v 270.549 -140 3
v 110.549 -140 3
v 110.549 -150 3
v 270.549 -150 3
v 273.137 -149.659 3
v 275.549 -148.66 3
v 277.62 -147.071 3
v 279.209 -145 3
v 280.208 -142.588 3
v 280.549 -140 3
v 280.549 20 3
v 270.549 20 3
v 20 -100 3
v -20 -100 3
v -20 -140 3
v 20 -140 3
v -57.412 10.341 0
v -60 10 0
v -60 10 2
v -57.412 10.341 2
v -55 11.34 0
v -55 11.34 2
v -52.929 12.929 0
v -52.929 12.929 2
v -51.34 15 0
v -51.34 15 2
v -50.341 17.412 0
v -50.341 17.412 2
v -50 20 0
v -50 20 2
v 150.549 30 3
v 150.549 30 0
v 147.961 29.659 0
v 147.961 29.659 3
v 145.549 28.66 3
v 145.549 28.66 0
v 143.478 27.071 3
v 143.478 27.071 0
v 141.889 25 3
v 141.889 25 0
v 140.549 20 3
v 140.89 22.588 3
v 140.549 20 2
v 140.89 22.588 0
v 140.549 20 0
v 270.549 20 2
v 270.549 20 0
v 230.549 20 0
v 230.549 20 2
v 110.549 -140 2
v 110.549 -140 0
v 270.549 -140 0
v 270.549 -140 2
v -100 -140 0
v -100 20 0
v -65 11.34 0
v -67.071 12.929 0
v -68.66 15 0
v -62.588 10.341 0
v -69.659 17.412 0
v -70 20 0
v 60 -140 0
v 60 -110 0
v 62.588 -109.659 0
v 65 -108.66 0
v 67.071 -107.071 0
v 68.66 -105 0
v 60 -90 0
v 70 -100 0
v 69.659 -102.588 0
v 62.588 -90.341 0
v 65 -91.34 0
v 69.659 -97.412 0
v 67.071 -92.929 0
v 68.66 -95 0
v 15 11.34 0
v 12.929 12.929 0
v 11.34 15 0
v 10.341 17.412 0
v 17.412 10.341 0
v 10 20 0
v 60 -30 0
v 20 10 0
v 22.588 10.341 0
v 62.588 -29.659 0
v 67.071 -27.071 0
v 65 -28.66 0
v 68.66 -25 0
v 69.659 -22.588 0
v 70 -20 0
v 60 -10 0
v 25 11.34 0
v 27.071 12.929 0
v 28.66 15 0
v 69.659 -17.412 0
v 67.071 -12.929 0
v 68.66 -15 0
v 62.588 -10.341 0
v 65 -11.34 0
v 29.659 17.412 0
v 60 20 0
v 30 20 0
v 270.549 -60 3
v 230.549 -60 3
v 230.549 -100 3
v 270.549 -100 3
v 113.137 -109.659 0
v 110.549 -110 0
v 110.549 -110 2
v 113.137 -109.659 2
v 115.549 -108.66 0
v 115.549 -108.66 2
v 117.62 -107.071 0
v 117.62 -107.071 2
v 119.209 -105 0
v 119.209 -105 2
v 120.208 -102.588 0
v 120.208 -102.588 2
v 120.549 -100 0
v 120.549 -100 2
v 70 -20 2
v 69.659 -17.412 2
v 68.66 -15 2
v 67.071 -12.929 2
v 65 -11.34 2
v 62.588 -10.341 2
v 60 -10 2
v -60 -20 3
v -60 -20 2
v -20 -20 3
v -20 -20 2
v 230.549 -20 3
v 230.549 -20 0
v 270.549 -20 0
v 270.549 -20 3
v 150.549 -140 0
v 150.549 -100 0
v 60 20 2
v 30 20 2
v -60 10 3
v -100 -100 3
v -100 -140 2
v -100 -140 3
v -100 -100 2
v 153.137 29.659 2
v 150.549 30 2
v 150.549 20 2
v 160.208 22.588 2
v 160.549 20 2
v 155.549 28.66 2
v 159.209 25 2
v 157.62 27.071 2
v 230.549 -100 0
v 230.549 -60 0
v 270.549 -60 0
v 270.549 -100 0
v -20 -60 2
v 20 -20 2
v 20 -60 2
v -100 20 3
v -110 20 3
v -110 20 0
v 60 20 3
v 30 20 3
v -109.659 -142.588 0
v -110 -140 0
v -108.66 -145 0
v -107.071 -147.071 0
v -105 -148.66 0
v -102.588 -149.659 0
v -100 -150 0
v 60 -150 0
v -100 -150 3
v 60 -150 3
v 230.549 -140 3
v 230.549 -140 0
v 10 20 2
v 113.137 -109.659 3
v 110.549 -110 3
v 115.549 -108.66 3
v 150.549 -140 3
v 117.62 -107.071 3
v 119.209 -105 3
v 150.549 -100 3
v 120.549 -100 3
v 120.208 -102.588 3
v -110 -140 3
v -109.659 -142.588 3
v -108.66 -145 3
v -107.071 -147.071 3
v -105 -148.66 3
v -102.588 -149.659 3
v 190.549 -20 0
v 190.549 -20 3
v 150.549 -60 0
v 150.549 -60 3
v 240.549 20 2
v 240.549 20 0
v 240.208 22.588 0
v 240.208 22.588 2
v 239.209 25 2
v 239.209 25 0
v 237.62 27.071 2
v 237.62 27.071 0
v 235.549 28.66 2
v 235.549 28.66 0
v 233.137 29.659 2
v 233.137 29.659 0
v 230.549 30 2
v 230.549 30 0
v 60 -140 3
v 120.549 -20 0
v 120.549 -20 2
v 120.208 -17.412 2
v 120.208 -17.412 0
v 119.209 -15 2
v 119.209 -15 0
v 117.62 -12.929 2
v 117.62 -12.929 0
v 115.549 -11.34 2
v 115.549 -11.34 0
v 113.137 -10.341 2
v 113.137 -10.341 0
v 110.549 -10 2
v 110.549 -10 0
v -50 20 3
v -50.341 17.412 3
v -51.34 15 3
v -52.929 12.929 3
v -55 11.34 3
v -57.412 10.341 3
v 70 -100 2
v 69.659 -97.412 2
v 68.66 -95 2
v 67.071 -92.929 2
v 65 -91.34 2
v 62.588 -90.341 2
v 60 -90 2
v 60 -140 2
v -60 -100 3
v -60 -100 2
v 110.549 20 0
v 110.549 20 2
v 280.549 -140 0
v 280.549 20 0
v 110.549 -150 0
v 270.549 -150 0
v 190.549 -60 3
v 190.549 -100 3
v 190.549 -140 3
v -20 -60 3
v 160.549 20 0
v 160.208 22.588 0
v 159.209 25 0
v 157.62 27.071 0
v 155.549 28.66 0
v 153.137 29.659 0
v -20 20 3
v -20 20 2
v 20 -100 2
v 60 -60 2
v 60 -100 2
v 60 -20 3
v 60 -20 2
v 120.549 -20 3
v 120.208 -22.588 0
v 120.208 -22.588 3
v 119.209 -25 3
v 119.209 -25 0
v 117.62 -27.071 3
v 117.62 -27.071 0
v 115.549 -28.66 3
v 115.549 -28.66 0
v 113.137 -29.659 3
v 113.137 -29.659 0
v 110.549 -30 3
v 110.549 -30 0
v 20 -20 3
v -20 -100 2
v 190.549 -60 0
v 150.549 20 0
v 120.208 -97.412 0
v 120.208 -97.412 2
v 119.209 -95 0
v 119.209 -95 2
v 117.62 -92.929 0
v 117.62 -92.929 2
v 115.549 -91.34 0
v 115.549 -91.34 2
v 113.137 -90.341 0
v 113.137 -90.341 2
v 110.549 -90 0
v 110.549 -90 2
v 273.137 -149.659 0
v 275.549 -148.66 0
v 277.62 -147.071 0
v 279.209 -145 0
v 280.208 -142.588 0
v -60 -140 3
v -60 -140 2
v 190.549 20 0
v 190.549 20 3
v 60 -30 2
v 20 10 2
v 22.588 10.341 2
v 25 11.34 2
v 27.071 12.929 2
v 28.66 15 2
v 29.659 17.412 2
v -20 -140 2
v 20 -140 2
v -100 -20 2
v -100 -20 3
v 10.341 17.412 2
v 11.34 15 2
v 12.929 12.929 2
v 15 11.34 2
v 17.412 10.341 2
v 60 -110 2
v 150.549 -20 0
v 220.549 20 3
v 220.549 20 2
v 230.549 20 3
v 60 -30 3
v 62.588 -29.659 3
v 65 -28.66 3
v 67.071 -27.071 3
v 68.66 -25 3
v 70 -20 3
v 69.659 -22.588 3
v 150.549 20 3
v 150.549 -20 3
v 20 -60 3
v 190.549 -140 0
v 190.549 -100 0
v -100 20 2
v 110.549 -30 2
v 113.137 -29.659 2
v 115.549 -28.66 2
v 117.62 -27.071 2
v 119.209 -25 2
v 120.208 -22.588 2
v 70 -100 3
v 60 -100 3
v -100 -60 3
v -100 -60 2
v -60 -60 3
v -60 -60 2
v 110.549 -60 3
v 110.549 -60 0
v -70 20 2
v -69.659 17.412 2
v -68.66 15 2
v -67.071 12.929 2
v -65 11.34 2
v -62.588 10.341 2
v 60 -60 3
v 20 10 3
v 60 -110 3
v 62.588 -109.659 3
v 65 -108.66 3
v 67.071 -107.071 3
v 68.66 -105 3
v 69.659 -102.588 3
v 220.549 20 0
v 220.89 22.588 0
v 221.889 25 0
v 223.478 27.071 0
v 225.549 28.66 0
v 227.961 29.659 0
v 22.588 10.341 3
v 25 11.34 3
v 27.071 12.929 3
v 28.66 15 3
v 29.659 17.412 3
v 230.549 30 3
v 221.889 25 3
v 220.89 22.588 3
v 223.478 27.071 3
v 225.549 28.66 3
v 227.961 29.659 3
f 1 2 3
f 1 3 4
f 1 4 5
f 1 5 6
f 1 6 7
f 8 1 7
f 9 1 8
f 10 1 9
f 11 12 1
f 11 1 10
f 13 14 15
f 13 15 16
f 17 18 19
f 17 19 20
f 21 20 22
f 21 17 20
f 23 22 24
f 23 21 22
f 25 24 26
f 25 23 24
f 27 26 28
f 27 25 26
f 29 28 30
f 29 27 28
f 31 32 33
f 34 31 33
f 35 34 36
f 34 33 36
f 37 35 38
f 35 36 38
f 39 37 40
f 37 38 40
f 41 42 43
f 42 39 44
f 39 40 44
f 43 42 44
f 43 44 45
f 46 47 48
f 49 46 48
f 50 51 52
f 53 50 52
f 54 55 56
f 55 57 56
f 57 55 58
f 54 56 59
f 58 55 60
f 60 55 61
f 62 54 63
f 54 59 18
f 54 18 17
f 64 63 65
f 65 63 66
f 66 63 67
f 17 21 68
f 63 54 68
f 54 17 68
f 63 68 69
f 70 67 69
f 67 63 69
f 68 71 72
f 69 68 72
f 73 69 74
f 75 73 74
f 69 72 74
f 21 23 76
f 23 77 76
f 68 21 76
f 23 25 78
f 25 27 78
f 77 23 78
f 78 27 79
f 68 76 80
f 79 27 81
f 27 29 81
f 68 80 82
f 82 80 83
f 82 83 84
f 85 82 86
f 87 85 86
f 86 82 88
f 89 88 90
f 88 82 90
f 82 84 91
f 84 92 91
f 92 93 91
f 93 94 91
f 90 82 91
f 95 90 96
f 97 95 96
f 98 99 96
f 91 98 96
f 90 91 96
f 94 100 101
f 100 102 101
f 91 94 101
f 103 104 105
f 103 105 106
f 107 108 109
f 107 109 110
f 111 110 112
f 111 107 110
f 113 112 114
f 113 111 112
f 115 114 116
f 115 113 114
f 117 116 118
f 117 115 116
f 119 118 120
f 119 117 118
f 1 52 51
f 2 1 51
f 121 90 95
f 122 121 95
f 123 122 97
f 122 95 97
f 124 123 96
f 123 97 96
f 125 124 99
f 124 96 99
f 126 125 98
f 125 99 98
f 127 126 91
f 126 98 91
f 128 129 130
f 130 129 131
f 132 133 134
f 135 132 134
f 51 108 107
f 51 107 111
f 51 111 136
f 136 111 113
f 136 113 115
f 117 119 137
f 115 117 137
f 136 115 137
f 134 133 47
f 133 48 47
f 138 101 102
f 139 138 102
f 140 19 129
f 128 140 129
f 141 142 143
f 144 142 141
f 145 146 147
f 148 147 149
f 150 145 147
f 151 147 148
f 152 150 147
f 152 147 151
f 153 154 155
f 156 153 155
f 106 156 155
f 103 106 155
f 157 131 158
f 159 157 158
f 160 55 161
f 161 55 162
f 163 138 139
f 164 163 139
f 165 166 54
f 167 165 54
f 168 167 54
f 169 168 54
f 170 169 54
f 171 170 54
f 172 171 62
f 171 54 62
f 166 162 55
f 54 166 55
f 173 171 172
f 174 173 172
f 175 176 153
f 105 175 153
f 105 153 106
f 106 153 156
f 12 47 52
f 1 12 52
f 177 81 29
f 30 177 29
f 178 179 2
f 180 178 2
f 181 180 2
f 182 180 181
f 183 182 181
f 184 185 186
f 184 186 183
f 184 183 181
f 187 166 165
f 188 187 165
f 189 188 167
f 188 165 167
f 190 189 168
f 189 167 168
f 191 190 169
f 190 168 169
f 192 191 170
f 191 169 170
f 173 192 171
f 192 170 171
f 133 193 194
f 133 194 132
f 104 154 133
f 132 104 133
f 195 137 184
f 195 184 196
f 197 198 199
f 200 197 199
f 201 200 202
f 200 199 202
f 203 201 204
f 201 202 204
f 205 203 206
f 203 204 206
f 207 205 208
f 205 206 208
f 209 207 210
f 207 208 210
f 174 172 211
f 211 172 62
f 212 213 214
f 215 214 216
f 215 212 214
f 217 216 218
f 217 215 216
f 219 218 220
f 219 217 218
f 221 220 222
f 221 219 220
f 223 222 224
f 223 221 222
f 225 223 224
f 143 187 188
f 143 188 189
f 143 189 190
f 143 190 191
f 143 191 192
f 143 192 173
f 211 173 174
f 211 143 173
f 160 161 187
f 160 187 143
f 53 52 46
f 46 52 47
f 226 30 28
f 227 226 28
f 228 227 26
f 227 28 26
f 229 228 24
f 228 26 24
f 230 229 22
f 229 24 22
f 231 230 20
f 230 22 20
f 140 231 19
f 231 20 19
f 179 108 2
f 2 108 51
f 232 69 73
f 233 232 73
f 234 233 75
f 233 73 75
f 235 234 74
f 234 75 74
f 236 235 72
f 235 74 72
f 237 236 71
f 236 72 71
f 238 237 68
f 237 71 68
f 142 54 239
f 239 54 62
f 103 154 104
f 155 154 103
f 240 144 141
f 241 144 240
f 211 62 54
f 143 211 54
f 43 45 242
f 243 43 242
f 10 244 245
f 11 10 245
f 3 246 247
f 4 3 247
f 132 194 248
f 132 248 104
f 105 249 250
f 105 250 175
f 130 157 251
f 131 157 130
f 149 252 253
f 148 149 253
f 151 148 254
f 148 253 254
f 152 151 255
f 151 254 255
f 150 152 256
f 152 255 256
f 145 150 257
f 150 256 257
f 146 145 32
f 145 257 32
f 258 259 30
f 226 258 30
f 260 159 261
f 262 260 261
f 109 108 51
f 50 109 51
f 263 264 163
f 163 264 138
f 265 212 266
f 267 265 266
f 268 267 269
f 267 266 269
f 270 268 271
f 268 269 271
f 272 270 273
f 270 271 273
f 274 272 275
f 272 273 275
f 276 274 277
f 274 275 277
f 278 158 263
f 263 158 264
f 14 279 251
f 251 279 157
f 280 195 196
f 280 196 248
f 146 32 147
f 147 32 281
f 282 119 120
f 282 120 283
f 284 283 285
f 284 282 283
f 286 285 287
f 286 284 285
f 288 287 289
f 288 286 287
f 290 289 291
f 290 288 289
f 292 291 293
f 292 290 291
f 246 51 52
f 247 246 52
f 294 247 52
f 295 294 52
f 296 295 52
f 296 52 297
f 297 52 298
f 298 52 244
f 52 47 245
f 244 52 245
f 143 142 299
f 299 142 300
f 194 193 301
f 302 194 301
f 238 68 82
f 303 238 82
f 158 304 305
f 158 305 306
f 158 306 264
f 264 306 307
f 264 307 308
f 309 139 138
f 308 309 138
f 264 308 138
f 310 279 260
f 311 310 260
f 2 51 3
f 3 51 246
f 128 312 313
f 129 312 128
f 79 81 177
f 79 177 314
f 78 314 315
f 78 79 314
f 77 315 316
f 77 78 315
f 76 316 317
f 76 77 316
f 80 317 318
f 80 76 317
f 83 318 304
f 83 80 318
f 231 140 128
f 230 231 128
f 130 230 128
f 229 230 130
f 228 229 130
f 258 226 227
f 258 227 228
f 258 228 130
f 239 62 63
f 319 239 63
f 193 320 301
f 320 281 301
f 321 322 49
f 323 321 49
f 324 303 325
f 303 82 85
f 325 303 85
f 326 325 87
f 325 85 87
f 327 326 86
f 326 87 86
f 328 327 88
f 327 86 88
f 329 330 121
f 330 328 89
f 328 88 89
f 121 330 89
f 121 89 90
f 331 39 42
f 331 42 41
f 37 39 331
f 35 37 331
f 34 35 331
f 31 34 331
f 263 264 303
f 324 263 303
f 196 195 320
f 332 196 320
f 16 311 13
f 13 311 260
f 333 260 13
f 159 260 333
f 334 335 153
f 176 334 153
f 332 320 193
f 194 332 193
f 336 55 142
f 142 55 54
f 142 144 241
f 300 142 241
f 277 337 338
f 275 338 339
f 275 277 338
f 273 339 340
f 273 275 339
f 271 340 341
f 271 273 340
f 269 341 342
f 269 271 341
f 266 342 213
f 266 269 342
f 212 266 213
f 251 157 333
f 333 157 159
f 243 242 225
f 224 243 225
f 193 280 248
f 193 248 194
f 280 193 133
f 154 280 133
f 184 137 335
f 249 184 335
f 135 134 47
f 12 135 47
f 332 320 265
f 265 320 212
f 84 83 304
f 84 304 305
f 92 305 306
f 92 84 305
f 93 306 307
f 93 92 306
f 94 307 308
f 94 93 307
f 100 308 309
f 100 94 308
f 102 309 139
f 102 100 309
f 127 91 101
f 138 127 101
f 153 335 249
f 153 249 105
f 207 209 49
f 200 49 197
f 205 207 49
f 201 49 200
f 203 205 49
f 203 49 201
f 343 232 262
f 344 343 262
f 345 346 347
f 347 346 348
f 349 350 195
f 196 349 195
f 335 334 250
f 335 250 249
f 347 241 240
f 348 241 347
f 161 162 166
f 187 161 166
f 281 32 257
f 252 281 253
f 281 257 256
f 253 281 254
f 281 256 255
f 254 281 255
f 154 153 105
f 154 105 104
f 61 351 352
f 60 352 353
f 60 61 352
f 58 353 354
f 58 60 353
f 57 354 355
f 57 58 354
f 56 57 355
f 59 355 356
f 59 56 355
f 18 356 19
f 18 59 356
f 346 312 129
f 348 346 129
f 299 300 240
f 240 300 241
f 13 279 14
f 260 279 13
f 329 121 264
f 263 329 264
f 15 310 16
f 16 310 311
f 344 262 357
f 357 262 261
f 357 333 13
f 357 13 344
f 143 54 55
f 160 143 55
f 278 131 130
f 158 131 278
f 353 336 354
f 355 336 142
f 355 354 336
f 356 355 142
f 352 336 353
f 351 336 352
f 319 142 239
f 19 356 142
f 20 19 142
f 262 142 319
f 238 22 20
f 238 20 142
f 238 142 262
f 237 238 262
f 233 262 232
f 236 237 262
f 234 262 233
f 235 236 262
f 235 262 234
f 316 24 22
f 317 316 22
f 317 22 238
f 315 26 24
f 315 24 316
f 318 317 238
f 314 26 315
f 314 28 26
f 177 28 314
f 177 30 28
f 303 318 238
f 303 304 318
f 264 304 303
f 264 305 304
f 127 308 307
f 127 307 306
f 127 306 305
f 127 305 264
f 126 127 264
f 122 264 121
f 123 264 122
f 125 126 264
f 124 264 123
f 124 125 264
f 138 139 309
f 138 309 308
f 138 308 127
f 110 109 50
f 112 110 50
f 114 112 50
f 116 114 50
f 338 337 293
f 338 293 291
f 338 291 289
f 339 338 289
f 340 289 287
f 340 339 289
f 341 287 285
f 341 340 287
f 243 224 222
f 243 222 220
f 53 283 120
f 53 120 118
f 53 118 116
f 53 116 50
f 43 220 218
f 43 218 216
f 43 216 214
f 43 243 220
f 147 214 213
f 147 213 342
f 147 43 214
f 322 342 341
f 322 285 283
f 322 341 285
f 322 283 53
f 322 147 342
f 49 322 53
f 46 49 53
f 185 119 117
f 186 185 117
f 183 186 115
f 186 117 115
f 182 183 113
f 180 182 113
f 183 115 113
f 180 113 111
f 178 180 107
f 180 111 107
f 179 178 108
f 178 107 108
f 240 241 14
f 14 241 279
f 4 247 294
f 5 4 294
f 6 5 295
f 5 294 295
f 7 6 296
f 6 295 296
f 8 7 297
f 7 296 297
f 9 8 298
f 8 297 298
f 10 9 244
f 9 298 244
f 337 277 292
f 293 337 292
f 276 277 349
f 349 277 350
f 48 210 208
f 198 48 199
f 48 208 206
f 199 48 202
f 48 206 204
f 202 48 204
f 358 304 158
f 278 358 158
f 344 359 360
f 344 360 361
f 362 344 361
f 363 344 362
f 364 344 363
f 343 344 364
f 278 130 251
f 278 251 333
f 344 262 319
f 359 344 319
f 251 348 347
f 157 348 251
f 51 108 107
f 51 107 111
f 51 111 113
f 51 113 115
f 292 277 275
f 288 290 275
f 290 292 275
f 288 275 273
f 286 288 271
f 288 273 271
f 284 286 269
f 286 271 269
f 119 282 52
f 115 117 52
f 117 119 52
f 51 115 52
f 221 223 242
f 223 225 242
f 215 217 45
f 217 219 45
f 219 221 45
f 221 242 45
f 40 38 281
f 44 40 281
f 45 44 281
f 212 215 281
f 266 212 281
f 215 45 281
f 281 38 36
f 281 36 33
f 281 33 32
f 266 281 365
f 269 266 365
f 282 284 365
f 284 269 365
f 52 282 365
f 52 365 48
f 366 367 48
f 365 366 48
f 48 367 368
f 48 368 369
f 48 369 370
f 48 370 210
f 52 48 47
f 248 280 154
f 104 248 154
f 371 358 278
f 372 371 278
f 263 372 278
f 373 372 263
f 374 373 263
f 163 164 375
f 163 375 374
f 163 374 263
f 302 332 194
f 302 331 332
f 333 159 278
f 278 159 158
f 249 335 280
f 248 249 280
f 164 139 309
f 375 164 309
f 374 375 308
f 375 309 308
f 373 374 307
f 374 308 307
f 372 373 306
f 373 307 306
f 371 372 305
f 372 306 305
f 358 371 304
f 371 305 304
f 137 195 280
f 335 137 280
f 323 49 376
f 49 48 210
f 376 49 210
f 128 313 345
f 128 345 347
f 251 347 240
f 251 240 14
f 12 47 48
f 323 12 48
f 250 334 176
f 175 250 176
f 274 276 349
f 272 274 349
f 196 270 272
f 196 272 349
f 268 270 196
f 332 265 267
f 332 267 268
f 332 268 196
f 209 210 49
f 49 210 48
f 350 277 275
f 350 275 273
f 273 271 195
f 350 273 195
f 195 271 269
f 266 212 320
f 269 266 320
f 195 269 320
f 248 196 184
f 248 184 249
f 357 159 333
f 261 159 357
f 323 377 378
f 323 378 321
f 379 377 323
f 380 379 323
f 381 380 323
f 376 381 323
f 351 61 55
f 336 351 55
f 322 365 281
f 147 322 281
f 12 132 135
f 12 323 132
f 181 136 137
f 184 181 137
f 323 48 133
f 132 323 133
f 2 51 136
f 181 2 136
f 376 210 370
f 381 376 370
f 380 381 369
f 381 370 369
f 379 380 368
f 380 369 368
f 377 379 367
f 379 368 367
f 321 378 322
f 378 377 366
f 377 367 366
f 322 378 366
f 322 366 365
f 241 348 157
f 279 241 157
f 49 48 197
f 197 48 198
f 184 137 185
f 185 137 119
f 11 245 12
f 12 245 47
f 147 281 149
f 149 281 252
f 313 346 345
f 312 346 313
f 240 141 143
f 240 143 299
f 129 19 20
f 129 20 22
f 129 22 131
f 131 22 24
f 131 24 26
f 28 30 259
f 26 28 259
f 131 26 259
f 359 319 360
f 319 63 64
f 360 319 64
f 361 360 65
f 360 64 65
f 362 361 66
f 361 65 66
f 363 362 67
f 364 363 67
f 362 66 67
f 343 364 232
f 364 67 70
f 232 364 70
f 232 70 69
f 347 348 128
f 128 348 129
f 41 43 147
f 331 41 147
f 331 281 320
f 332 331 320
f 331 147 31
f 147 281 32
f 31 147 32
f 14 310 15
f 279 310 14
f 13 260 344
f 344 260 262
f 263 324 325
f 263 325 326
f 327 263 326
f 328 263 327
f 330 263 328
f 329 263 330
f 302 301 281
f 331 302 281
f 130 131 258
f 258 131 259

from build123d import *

# Parameters (mm, degrees)
F0_W      = 40
F0_H      = 40
F1_DEPTH  = 2
F3_DEPTH  = 2
F4_DEPTH  = 5
F2_W      = 40
F2_H      = 40
F5_DEPTH  = 1
F6_DEPTH  = 2
F7_DEPTH  = 3
F8_DEPTH  = 4
F9_DEPTH  = 3
F10_DEPTH = 3
F11_DEPTH = 3
F12_DEPTH = 2


with BuildPart() as f1:
    # F0 (on Top) → F1 (new body)
    with BuildSketch(Plane.XY):
        with BuildLine():
            Line((-100, -20), (-60, -20))
            Line((-60, -20), (-60, 10))
            ThreePointArc((-60, 10), (-67.0710678119, 12.9289321881), (-70, 20))
            Line((-70, 20), (-100, 20))
            Line((-100, 20), (-100, -20))
        make_face()
        with BuildLine():
            ThreePointArc((-70, 20), (-67.0710678119, 12.9289321881), (-60, 10))
            Line((-60, 10), (-60, 20))
            Line((-60, 20), (-70, 20))
        make_face()
        with BuildLine():
            ThreePointArc((-60, 10), (-52.9289321881, 12.9289321881), (-50, 20))
            Line((-50, 20), (-60, 20))
            Line((-60, 20), (-60, 10))
        make_face()
        with BuildLine():
            Line((-60, -20), (-20, -20))
            Line((-20, -20), (-20, 20))
            Line((-20, 20), (-50, 20))
            ThreePointArc((-50, 20), (-52.9289321881, 12.9289321881), (-60, 10))
            Line((-60, 10), (-60, -20))
        make_face()
        with BuildLine():
            Line((-20, -20), (20, -20))
            Line((20, -20), (20, 10))
            ThreePointArc((20, 10), (12.9289321881, 12.9289321881), (10, 20))
            Line((10, 20), (-20, 20))
            Line((-20, 20), (-20, -20))
        make_face()
        with BuildLine():
            ThreePointArc((10, 20), (12.9289321881, 12.9289321881), (20, 10))
            Line((20, 10), (20, 20))
            Line((20, 20), (10, 20))
        make_face()
        with BuildLine():
            Line((20, 20), (20, 10))
            ThreePointArc((20, 10), (27.0710678119, 12.9289321881), (30, 20))
            Line((30, 20), (20, 20))
        make_face()
        with BuildLine():
            Line((20, 10), (20, -20))
            Line((20, -20), (50, -20))
            ThreePointArc((50, -20), (52.9289321881, -12.9289321881), (60, -10))
            Line((60, -10), (60, 20))
            Line((60, 20), (30, 20))
            ThreePointArc((30, 20), (27.0710678119, 12.9289321881), (20, 10))
        make_face()
        with BuildLine():
            ThreePointArc((60, -10), (52.9289321881, -12.9289321881), (50, -20))
            Line((50, -20), (60, -20))
            Line((60, -20), (60, -10))
        make_face()
        with BuildLine():
            Line((60, -20), (50, -20))
            ThreePointArc((50, -20), (52.9289321881, -27.0710678119), (60, -30))
            Line((60, -30), (60, -20))
        make_face()
        with BuildLine():
            Line((50, -20), (20, -20))
            Line((20, -20), (20, -60))
            Line((20, -60), (60, -60))
            Line((60, -60), (60, -30))
            ThreePointArc((60, -30), (52.9289321881, -27.0710678119), (50, -20))
        make_face()
        with Locations((0, -40)):
            Rectangle(F0_W, F0_H)
        with Locations((-40, -40)):
            Rectangle(F0_W, F0_H)
        with Locations((-80, -40)):
            Rectangle(F0_W, F0_H)
        with Locations((-80, -80)):
            Rectangle(F0_W, F0_H)
        with BuildLine():
            Line((-60, -140), (-60, -100))
            Line((-60, -100), (-100, -100))
            Line((-100, -100), (-100, -130))
            ThreePointArc((-100, -130), (-92.9289321881, -132.9289321881), (-90, -140))
            Line((-90, -140), (-60, -140))
        make_face()
        with Locations((-40, -120)):
            Rectangle(F0_W, F0_H)
        with Locations((-40, -80)):
            Rectangle(F0_W, F0_H)
        with Locations((0, -80)):
            Rectangle(F0_W, F0_H)
        with Locations((0, -120)):
            Rectangle(F0_W, F0_H)
        with BuildLine():
            Line((50, -100), (20, -100))
            Line((20, -100), (20, -140))
            Line((20, -140), (60, -140))
            Line((60, -140), (60, -110))
            ThreePointArc((60, -110), (52.9289321881, -107.0710678119), (50, -100))
        make_face()
        with BuildLine():
            Line((60, -60), (20, -60))
            Line((20, -60), (20, -100))
            Line((20, -100), (50, -100))
            ThreePointArc((50, -100), (52.9289321881, -92.9289321881), (60, -90))
            Line((60, -90), (60, -60))
        make_face()
        with BuildLine():
            Line((60, -100), (60, -90))
            ThreePointArc((60, -90), (52.9289321881, -92.9289321881), (50, -100))
            Line((50, -100), (60, -100))
        make_face()
        with BuildLine():
            Line((60, -100), (50, -100))
            ThreePointArc((50, -100), (52.9289321881, -107.0710678119), (60, -110))
            Line((60, -110), (60, -100))
        make_face()
        with BuildLine():
            ThreePointArc((-90, -140), (-92.9289321881, -132.9289321881), (-100, -130))
            Line((-100, -130), (-100, -140))
            Line((-100, -140), (-90, -140))
        make_face()
    extrude(amount=F1_DEPTH)

    # F0 (on Top) → F3 (join)
    with BuildSketch(Plane.XY):
        with BuildLine():
            ThreePointArc((70, -100), (67.0710678119, -92.9289321881), (60, -90))
            Line((60, -90), (60, -100))
            Line((60, -100), (70, -100))
        make_face()
        with BuildLine():
            Line((60, -10), (60, -20))
            Line((60, -20), (70, -20))
            ThreePointArc((70, -20), (67.0710678119, -12.9289321881), (60, -10))
        make_face()
    extrude(amount=F3_DEPTH)

    # F0 (on Top) → F4 (cut)
    with BuildSketch(Plane.XY):
        with BuildLine():
            ThreePointArc((-70, 20), (-67.0710678119, 12.9289321881), (-60, 10))
            Line((-60, 10), (-60, 20))
            Line((-60, 20), (-70, 20))
        make_face()
        with BuildLine():
            ThreePointArc((-60, 10), (-52.9289321881, 12.9289321881), (-50, 20))
            Line((-50, 20), (-60, 20))
            Line((-60, 20), (-60, 10))
        make_face()
        with BuildLine():
            ThreePointArc((10, 20), (12.9289321881, 12.9289321881), (20, 10))
            Line((20, 10), (20, 20))
            Line((20, 20), (10, 20))
        make_face()
        with BuildLine():
            Line((20, 20), (20, 10))
            ThreePointArc((20, 10), (27.0710678119, 12.9289321881), (30, 20))
            Line((30, 20), (20, 20))
        make_face()
    extrude(amount=F4_DEPTH, mode=Mode.SUBTRACT)

    # F0 (on Top) → F10 (join)
    with BuildSketch(Plane.XY):
        with BuildLine():
            Line((70, -100), (60, -100))
            Line((60, -100), (60, -110))
            ThreePointArc((60, -110), (67.0710678119, -107.0710678119), (70, -100))
        make_face()
        with BuildLine():
            Line((70, -20), (60, -20))
            Line((60, -20), (60, -30))
            ThreePointArc((60, -30), (67.0710678119, -27.0710678119), (70, -20))
        make_face()
    extrude(amount=F10_DEPTH)


with BuildPart() as f5:
    # F2 (on face) → F5 (new body)
    with BuildSketch(Plane.XY.offset(2)):
        with Locations((-80, -120)):
            Rectangle(F2_W, F2_H)
    extrude(amount=F5_DEPTH)


with BuildPart() as f5b:
    # F2 (on face) → F5, piece 2 (new body)
    with BuildSketch(Plane.XY.offset(2)):
        with Locations((0, -120)):
            Rectangle(F2_W, F2_H)
    extrude(amount=F5_DEPTH)


with BuildPart() as f5c:
    # F2 (on face) → F5, piece 3 (new body)
    with BuildSketch(Plane.XY.offset(2)):
        with Locations((-40, -80)):
            Rectangle(F2_W, F2_H)
    extrude(amount=F5_DEPTH)


with BuildPart() as f5d:
    # F2 (on face) → F5, piece 4 (new body)
    with BuildSketch(Plane.XY.offset(2)):
        with Locations((40, -80)):
            Rectangle(F2_W, F2_H)
    extrude(amount=F5_DEPTH)


with BuildPart() as f5e:
    # F2 (on face) → F5, piece 5 (new body)
    with BuildSketch(Plane.XY.offset(2)):
        with Locations((-80, -40)):
            Rectangle(F2_W, F2_H)
    extrude(amount=F5_DEPTH)


with BuildPart() as f5f:
    # F2 (on face) → F5, piece 6 (new body)
    with BuildSketch(Plane.XY.offset(2)):
        with Locations((0, -40)):
            Rectangle(F2_W, F2_H)
    extrude(amount=F5_DEPTH)


with BuildPart() as f5g:
    # F2 (on face) → F5, piece 7 (new body)
    with BuildSketch(Plane.XY.offset(2)):
        with BuildLine():
            Line((60, -20), (60, 20))
            Line((60, 20), (30, 20))
            ThreePointArc((30, 20), (27.0710678119, 12.9289321881), (20, 10))
            Line((20, 10), (20, -20))
            Line((20, -20), (60, -20))
        make_face()
    extrude(amount=F5_DEPTH)


with BuildPart() as f5h:
    # F2 (on face) → F5, piece 8 (new body)
    with BuildSketch(Plane.XY.offset(2)):
        with BuildLine():
            Line((-60, -20), (-20, -20))
            Line((-20, -20), (-20, 20))
            Line((-20, 20), (-50, 20))
            ThreePointArc((-50, 20), (-52.9289321881, 12.9289321881), (-60, 10))
            Line((-60, 10), (-60, -20))
        make_face()
    extrude(amount=F5_DEPTH)


with BuildPart() as f6:
    # F0 (on Top) → F6 (new body)
    with BuildSketch(Plane.XY):
        with BuildLine():
            Line((150.5487942696, -140), (150.5487942696, -100))
            Line((150.5487942696, -100), (120.5487942696, -100))
            ThreePointArc((120.5487942696, -100), (117.6198620814, -107.0710678119), (110.5487942696, -110))
            Line((110.5487942696, -110), (110.5487942696, -140))
            Line((110.5487942696, -140), (150.5487942696, -140))
        make_face()
        with BuildLine():
            ThreePointArc((110.5487942696, -110), (117.6198620814, -107.0710678119), (120.5487942696, -100))
            Line((120.5487942696, -100), (110.5487942696, -100))
            Line((110.5487942696, -100), (110.5487942696, -110))
        make_face()
        with BuildLine():
            ThreePointArc((120.5487942696, -100), (117.6198620814, -92.9289321881), (110.5487942696, -90))
            Line((110.5487942696, -90), (110.5487942696, -100))
            Line((110.5487942696, -100), (120.5487942696, -100))
        make_face()
        with BuildLine():
            Line((150.5487942696, -100), (150.5487942696, -60))
            Line((150.5487942696, -60), (110.5487942696, -60))
            Line((110.5487942696, -60), (110.5487942696, -90))
            ThreePointArc((110.5487942696, -90), (117.6198620814, -92.9289321881), (120.5487942696, -100))
            Line((120.5487942696, -100), (150.5487942696, -100))
        make_face()
        with BuildLine():
            Line((150.5487942696, -20), (120.5487942696, -20))
            ThreePointArc((120.5487942696, -20), (117.6198620814, -27.0710678119), (110.5487942696, -30))
            Line((110.5487942696, -30), (110.5487942696, -60))
            Line((110.5487942696, -60), (150.5487942696, -60))
            Line((150.5487942696, -60), (150.5487942696, -20))
        make_face()
        with BuildLine():
            Line((120.5487942696, -20), (110.5487942696, -20))
            Line((110.5487942696, -20), (110.5487942696, -30))
            ThreePointArc((110.5487942696, -30), (117.6198620814, -27.0710678119), (120.5487942696, -20))
        make_face()
        with BuildLine():
            ThreePointArc((120.5487942696, -20), (117.6198620814, -12.9289321881), (110.5487942696, -10))
            Line((110.5487942696, -10), (110.5487942696, -20))
            Line((110.5487942696, -20), (120.5487942696, -20))
        make_face()
        with BuildLine():
            Line((140.5487942696, 20), (110.5487942696, 20))
            Line((110.5487942696, 20), (110.5487942696, -10))
            ThreePointArc((110.5487942696, -10), (117.6198620814, -12.9289321881), (120.5487942696, -20))
            Line((120.5487942696, -20), (150.5487942696, -20))
            Line((150.5487942696, -20), (150.5487942696, 10))
            ThreePointArc((150.5487942696, 10), (143.4777264577, 12.9289321881), (140.5487942696, 20))
        make_face()
        with BuildLine():
            Line((150.5487942696, 20), (140.5487942696, 20))
            ThreePointArc((140.5487942696, 20), (143.4777264577, 12.9289321881), (150.5487942696, 10))
            Line((150.5487942696, 10), (150.5487942696, 20))
        make_face()
        with BuildLine():
            Line((160.5487942696, 20), (150.5487942696, 20))
            Line((150.5487942696, 20), (150.5487942696, 10))
            ThreePointArc((150.5487942696, 10), (157.6198620814, 12.9289321881), (160.5487942696, 20))
        make_face()
        with BuildLine():
            ThreePointArc((160.5487942696, 20), (157.6198620814, 12.9289321881), (150.5487942696, 10))
            Line((150.5487942696, 10), (150.5487942696, -20))
            Line((150.5487942696, -20), (190.5487942696, -20))
            Line((190.5487942696, -20), (190.5487942696, 20))
            Line((190.5487942696, 20), (160.5487942696, 20))
        make_face()
        with BuildLine():
            Line((220.5487942696, 20), (190.5487942696, 20))
            Line((190.5487942696, 20), (190.5487942696, -20))
            Line((190.5487942696, -20), (230.5487942696, -20))
            Line((230.5487942696, -20), (230.5487942696, 10))
            ThreePointArc((230.5487942696, 10), (223.4777264577, 12.9289321881), (220.5487942696, 20))
        make_face()
        with BuildLine():
            Line((230.5487942696, 20), (220.5487942696, 20))
            ThreePointArc((220.5487942696, 20), (223.4777264577, 12.9289321881), (230.5487942696, 10))
            Line((230.5487942696, 10), (230.5487942696, 20))
        make_face()
        with BuildLine():
            Line((240.5487942696, 20), (230.5487942696, 20))
            Line((230.5487942696, 20), (230.5487942696, 10))
            ThreePointArc((230.5487942696, 10), (237.6198620814, 12.9289321881), (240.5487942696, 20))
        make_face()
        with BuildLine():
            Line((230.5487942696, 10), (230.5487942696, -20))
            Line((230.5487942696, -20), (270.5487942696, -20))
            Line((270.5487942696, -20), (270.5487942696, 20))
            Line((270.5487942696, 20), (240.5487942696, 20))
            ThreePointArc((240.5487942696, 20), (237.6198620814, 12.9289321881), (230.5487942696, 10))
        make_face()
        with Locations((250.5487942696, -40)):
            Rectangle(F0_W, F0_H)
        with Locations((210.5487942696, -40)):
            Rectangle(F0_W, F0_H)
        with Locations((170.5487942696, -40)):
            Rectangle(F0_W, F0_H)
        with Locations((170.5487942696, -80)):
            Rectangle(F0_W, F0_H)
        with Locations((210.5487942696, -80)):
            Rectangle(F0_W, F0_H)
        with Locations((250.5487942696, -80)):
            Rectangle(F0_W, F0_H)
        with BuildLine():
            Line((270.5487942696, -100), (230.5487942696, -100))
            Line((230.5487942696, -100), (230.5487942696, -140))
            Line((230.5487942696, -140), (260.5487942696, -140))
            ThreePointArc((260.5487942696, -140), (263.4777264577, -132.9289321881), (270.5487942696, -130))
            Line((270.5487942696, -130), (270.5487942696, -100))
        make_face()
        with Locations((210.5487942696, -120)):
            Rectangle(F0_W, F0_H)
        with Locations((170.5487942696, -120)):
            Rectangle(F0_W, F0_H)
        with BuildLine():
            ThreePointArc((270.5487942696, -130), (263.4777264577, -132.9289321881), (260.5487942696, -140))
            Line((260.5487942696, -140), (270.5487942696, -140))
            Line((270.5487942696, -140), (270.5487942696, -130))
        make_face()
    extrude(amount=F6_DEPTH)

    # F0 (on Top) → F7 (join)
    with BuildSketch(Plane.XY):
        with BuildLine():
            ThreePointArc((150.5487942696, 30), (143.4777264577, 27.0710678119), (140.5487942696, 20))
            Line((140.5487942696, 20), (150.5487942696, 20))
            Line((150.5487942696, 20), (150.5487942696, 30))
        make_face()
        with BuildLine():
            ThreePointArc((230.5487942696, 30), (223.4777264577, 27.0710678119), (220.5487942696, 20))
            Line((220.5487942696, 20), (230.5487942696, 20))
            Line((230.5487942696, 20), (230.5487942696, 30))
        make_face()
    extrude(amount=F7_DEPTH)

    # F0 (on Top) → F8 (cut)
    with BuildSketch(Plane.XY):
        with BuildLine():
            ThreePointArc((120.5487942696, -100), (117.6198620814, -92.9289321881), (110.5487942696, -90))
            Line((110.5487942696, -90), (110.5487942696, -100))
            Line((110.5487942696, -100), (120.5487942696, -100))
        make_face()
        with BuildLine():
            ThreePointArc((110.5487942696, -110), (117.6198620814, -107.0710678119), (120.5487942696, -100))
            Line((120.5487942696, -100), (110.5487942696, -100))
            Line((110.5487942696, -100), (110.5487942696, -110))
        make_face()
        with BuildLine():
            ThreePointArc((120.5487942696, -20), (117.6198620814, -12.9289321881), (110.5487942696, -10))
            Line((110.5487942696, -10), (110.5487942696, -20))
            Line((110.5487942696, -20), (120.5487942696, -20))
        make_face()
        with BuildLine():
            Line((120.5487942696, -20), (110.5487942696, -20))
            Line((110.5487942696, -20), (110.5487942696, -30))
            ThreePointArc((110.5487942696, -30), (117.6198620814, -27.0710678119), (120.5487942696, -20))
        make_face()
    extrude(amount=F8_DEPTH, mode=Mode.SUBTRACT)


with BuildPart() as f9:
    # F0 (on Top) → F9 (new body)
    with BuildSketch(Plane.XY):
        with BuildLine():
            Line((-100, -60), (-100, -20))
            Line((-100, -20), (-100, 20))
            Line((-100, 20), (-110, 20))
            Line((-110, 20), (-110, -140))
            ThreePointArc((-110, -140), (-107.0710678119, -132.9289321881), (-100, -130))
            Line((-100, -130), (-100, -100))
            Line((-100, -100), (-100, -60))
        make_face()
        Polygon((-100, -140), (-110, -140), (-100, -150), align=None)
        with BuildLine():
            ThreePointArc((-100, -150), (-92.9289321881, -147.0710678119), (-90, -140))
            Line((-90, -140), (-100, -140))
            Line((-100, -140), (-100, -150))
        make_face()
        with BuildLine():
            Line((60, -140), (20, -140))
            Line((20, -140), (-20, -140))
            Line((-20, -140), (-60, -140))
            Line((-60, -140), (-90, -140))
            ThreePointArc((-90, -140), (-92.9289321881, -147.0710678119), (-100, -150))
            Line((-100, -150), (60, -150))
            Line((60, -150), (60, -140))
        make_face()
        with BuildLine():
            ThreePointArc((-100, -130), (-107.0710678119, -132.9289321881), (-110, -140))
            Line((-110, -140), (-100, -140))
            Line((-100, -140), (-100, -130))
        make_face()
        with BuildLine():
            Line((-100, -150), (-110, -140))
            ThreePointArc((-110, -140), (-107.0710678119, -147.0710678119), (-100, -150))
        make_face()
    extrude(amount=F9_DEPTH)


with BuildPart() as f9b:
    # F0 (on Top) → F9, piece 2 (new body)
    with BuildSketch(Plane.XY):
        with BuildLine():
            Line((190.5487942696, -140), (150.5487942696, -140))
            Line((150.5487942696, -140), (110.5487942696, -140))
            Line((110.5487942696, -140), (110.5487942696, -150))
            Line((110.5487942696, -150), (270.5487942696, -150))
            ThreePointArc((270.5487942696, -150), (263.4777264577, -147.0710678119), (260.5487942696, -140))
            Line((260.5487942696, -140), (230.5487942696, -140))
            Line((230.5487942696, -140), (190.5487942696, -140))
        make_face()
        Polygon((270.5487942696, -140), (270.5487942696, -150), (280.5487942696, -140), align=None)
        with BuildLine():
            Line((270.5487942696, 20), (270.5487942696, -20))
            Line((270.5487942696, -20), (270.5487942696, -60))
            Line((270.5487942696, -60), (270.5487942696, -100))
            Line((270.5487942696, -100), (270.5487942696, -130))
            ThreePointArc((270.5487942696, -130), (277.6198620814, -132.9289321881), (280.5487942696, -140))
            Line((280.5487942696, -140), (280.5487942696, 20))
            Line((280.5487942696, 20), (270.5487942696, 20))
        make_face()
        with BuildLine():
            ThreePointArc((260.5487942696, -140), (263.4777264577, -147.0710678119), (270.5487942696, -150))
            Line((270.5487942696, -150), (270.5487942696, -140))
            Line((270.5487942696, -140), (260.5487942696, -140))
        make_face()
        with BuildLine():
            ThreePointArc((280.5487942696, -140), (277.6198620814, -132.9289321881), (270.5487942696, -130))
            Line((270.5487942696, -130), (270.5487942696, -140))
            Line((270.5487942696, -140), (280.5487942696, -140))
        make_face()
        with BuildLine():
            Line((280.5487942696, -140), (270.5487942696, -150))
            ThreePointArc((270.5487942696, -150), (277.6198620814, -147.0710678119), (280.5487942696, -140))
        make_face()
    extrude(amount=F9_DEPTH)


with BuildPart() as f11:
    # F0 (on Top) → F11 (new body)
    with BuildSketch(Plane.XY):
        with BuildLine():
            Line((150.5487942696, -20), (120.5487942696, -20))
            ThreePointArc((120.5487942696, -20), (117.6198620814, -27.0710678119), (110.5487942696, -30))
            Line((110.5487942696, -30), (110.5487942696, -60))
            Line((110.5487942696, -60), (150.5487942696, -60))
            Line((150.5487942696, -60), (150.5487942696, -20))
        make_face()
    extrude(amount=F11_DEPTH)


with BuildPart() as f11b:
    # F0 (on Top) → F11, piece 2 (new body)
    with BuildSketch(Plane.XY):
        with BuildLine():
            Line((150.5487942696, -140), (150.5487942696, -100))
            Line((150.5487942696, -100), (120.5487942696, -100))
            ThreePointArc((120.5487942696, -100), (117.6198620814, -107.0710678119), (110.5487942696, -110))
            Line((110.5487942696, -110), (110.5487942696, -140))
            Line((110.5487942696, -140), (150.5487942696, -140))
        make_face()
    extrude(amount=F11_DEPTH)


with BuildPart() as f11c:
    # F0 (on Top) → F11, piece 3 (new body)
    with BuildSketch(Plane.XY):
        with Locations((170.5487942696, -80)):
            Rectangle(F0_W, F0_H)
    extrude(amount=F11_DEPTH)


with BuildPart() as f11d:
    # F0 (on Top) → F11, piece 4 (new body)
    with BuildSketch(Plane.XY):
        with BuildLine():
            ThreePointArc((160.5487942696, 20), (157.6198620814, 12.9289321881), (150.5487942696, 10))
            Line((150.5487942696, 10), (150.5487942696, -20))
            Line((150.5487942696, -20), (190.5487942696, -20))
            Line((190.5487942696, -20), (190.5487942696, 20))
            Line((190.5487942696, 20), (160.5487942696, 20))
        make_face()
        with BuildLine():
            Line((160.5487942696, 20), (150.5487942696, 20))
            Line((150.5487942696, 20), (150.5487942696, 10))
            ThreePointArc((150.5487942696, 10), (157.6198620814, 12.9289321881), (160.5487942696, 20))
        make_face()
    extrude(amount=F11_DEPTH)


with BuildPart() as f11e:
    # F0 (on Top) → F11, piece 5 (new body)
    with BuildSketch(Plane.XY):
        with Locations((210.5487942696, -40)):
            Rectangle(F0_W, F0_H)
    extrude(amount=F11_DEPTH)


with BuildPart() as f11f:
    # F0 (on Top) → F11, piece 6 (new body)
    with BuildSketch(Plane.XY):
        with Locations((210.5487942696, -120)):
            Rectangle(F0_W, F0_H)
    extrude(amount=F11_DEPTH)


with BuildPart() as f11g:
    # F0 (on Top) → F11, piece 7 (new body)
    with BuildSketch(Plane.XY):
        with Locations((250.5487942696, -80)):
            Rectangle(F0_W, F0_H)
    extrude(amount=F11_DEPTH)


with BuildPart() as f11h:
    # F0 (on Top) → F11, piece 8 (new body)
    with BuildSketch(Plane.XY):
        with BuildLine():
            Line((230.5487942696, 10), (230.5487942696, -20))
            Line((230.5487942696, -20), (270.5487942696, -20))
            Line((270.5487942696, -20), (270.5487942696, 20))
            Line((270.5487942696, 20), (240.5487942696, 20))
            ThreePointArc((240.5487942696, 20), (237.6198620814, 12.9289321881), (230.5487942696, 10))
        make_face()
        with BuildLine():
            Line((240.5487942696, 20), (230.5487942696, 20))
            Line((230.5487942696, 20), (230.5487942696, 10))
            ThreePointArc((230.5487942696, 10), (237.6198620814, 12.9289321881), (240.5487942696, 20))
        make_face()
    extrude(amount=F11_DEPTH)


with BuildPart() as f12:
    # F0 (on Top) → F12 (new body)
    with BuildSketch(Plane.XY):
        with BuildLine():
            Line((150.5487942696, 30), (150.5487942696, 20))
            Line((150.5487942696, 20), (160.5487942696, 20))
            ThreePointArc((160.5487942696, 20), (157.6198620814, 27.0710678119), (150.5487942696, 30))
        make_face()
    extrude(amount=F12_DEPTH)


with BuildPart() as f12b:
    # F0 (on Top) → F12, piece 2 (new body)
    with BuildSketch(Plane.XY):
        with BuildLine():
            Line((230.5487942696, 30), (230.5487942696, 20))
            Line((230.5487942696, 20), (240.5487942696, 20))
            ThreePointArc((240.5487942696, 20), (237.6198620814, 27.0710678119), (230.5487942696, 30))
        make_face()
    extrude(amount=F12_DEPTH)


solid = Compound([f1.part, f5.part, f5b.part, f5c.part, f5d.part, f5e.part, f5f.part, f5g.part, f5h.part, f6.part, f9.part, f9b.part, f11.part, f11b.part, f11c.part, f11d.part, f11e.part, f11f.part, f11g.part, f11h.part, f12.part, f12b.part])
